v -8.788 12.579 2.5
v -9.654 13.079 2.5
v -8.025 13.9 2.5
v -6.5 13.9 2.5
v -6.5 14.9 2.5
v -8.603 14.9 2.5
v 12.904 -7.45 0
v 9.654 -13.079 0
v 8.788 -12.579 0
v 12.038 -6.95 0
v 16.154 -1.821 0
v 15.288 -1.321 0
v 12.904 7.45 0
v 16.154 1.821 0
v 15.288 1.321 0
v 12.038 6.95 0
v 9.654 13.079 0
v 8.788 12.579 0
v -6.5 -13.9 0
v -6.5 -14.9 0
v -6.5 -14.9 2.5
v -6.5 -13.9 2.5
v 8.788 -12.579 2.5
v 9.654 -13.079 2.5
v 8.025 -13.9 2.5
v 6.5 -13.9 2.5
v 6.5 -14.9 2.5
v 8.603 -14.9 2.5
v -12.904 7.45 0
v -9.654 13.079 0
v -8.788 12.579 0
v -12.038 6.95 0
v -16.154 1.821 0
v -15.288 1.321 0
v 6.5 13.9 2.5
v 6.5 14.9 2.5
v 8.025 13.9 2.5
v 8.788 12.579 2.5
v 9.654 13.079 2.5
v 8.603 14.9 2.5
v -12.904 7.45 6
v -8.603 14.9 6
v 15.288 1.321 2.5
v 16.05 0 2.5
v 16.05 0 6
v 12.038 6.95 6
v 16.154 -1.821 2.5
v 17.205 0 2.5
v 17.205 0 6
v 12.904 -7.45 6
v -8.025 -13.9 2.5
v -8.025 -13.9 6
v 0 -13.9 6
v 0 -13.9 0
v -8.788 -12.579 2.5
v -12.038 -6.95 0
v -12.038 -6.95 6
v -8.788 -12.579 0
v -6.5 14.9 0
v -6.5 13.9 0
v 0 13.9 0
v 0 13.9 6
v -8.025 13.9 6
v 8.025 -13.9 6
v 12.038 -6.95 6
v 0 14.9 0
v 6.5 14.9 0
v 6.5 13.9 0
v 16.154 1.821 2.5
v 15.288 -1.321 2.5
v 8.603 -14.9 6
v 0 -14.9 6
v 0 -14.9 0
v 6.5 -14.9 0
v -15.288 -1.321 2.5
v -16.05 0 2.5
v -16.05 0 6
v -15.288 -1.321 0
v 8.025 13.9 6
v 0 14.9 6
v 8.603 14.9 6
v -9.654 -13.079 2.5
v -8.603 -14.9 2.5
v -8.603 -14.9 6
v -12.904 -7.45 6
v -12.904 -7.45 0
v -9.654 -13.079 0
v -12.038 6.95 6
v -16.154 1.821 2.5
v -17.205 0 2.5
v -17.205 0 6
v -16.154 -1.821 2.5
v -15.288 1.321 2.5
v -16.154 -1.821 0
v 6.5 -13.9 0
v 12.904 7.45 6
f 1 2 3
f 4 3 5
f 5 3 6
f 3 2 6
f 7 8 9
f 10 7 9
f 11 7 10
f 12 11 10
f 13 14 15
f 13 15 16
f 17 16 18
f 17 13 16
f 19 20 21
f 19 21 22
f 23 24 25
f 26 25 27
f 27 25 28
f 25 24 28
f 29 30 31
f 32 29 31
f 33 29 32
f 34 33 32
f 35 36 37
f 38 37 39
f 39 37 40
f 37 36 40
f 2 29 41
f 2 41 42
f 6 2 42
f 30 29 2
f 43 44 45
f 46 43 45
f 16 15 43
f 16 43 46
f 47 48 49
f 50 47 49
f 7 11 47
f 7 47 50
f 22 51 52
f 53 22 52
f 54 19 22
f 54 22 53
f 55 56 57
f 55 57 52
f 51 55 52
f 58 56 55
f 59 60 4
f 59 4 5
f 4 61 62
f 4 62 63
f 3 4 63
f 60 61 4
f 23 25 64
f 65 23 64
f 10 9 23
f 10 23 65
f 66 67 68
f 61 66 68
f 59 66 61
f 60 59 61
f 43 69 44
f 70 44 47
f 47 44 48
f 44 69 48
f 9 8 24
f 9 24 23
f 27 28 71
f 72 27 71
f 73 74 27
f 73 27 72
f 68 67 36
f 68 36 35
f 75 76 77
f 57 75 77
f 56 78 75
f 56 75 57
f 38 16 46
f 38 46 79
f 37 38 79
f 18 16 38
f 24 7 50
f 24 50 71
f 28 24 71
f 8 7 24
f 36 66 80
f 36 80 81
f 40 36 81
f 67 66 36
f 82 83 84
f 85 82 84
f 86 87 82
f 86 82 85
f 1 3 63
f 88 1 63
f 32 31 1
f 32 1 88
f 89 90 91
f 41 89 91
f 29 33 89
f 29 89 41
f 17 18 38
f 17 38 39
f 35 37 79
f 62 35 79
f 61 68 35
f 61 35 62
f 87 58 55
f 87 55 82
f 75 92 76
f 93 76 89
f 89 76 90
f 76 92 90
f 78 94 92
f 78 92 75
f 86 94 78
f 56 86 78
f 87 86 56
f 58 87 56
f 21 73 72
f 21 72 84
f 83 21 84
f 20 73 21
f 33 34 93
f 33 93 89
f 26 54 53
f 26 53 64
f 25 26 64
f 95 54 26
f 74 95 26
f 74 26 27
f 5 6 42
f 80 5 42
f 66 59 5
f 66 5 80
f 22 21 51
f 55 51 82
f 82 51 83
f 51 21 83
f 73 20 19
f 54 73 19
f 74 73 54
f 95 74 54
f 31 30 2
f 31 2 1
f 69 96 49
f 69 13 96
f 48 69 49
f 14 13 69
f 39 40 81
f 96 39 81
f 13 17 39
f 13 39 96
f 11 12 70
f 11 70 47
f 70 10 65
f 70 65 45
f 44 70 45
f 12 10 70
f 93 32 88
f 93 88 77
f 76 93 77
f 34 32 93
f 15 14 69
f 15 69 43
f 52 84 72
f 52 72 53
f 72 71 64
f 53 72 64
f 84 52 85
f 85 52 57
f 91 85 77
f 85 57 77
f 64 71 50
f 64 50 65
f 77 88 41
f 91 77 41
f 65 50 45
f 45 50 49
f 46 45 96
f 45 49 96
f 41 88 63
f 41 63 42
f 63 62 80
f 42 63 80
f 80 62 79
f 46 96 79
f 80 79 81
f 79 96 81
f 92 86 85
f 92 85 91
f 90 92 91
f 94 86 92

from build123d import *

# Parameters (mm, degrees)
PAD_DEPTH          = 6
POCKET_DEPTH       = 2.5
POLARPATTERN_COUNT = 6


with BuildPart() as part:
    # Sketch → Pad (new body)
    with BuildSketch(Plane.XY):
        Polygon((0, 14.9), (8.602519, 14.9), (12.903779, 7.45), (12.037753, 6.95), (8.025169, 13.9), (0, 13.9), align=None)
    pad = extrude(amount=PAD_DEPTH)

    # Sketch001 → Pocket (cut)
    with BuildSketch(Plane.XY):
        Polygon((6.5, 11.25833), (11.775323, 14.304039), (6.5, 17.349749), align=None)
    pocket = extrude(amount=POCKET_DEPTH, mode=Mode.SUBTRACT)

    # PolarPattern: Pad, Pocket ×6 about axis
    polarpattern_axis = Axis((0, 0, 0), (0, 0, 1))
    for i in range(1, POLARPATTERN_COUNT):
        add(pad.rotate(polarpattern_axis, i * 360 / POLARPATTERN_COUNT))
        add(pocket.rotate(polarpattern_axis, i * 360 / POLARPATTERN_COUNT), mode=Mode.SUBTRACT)


solid = part.part
